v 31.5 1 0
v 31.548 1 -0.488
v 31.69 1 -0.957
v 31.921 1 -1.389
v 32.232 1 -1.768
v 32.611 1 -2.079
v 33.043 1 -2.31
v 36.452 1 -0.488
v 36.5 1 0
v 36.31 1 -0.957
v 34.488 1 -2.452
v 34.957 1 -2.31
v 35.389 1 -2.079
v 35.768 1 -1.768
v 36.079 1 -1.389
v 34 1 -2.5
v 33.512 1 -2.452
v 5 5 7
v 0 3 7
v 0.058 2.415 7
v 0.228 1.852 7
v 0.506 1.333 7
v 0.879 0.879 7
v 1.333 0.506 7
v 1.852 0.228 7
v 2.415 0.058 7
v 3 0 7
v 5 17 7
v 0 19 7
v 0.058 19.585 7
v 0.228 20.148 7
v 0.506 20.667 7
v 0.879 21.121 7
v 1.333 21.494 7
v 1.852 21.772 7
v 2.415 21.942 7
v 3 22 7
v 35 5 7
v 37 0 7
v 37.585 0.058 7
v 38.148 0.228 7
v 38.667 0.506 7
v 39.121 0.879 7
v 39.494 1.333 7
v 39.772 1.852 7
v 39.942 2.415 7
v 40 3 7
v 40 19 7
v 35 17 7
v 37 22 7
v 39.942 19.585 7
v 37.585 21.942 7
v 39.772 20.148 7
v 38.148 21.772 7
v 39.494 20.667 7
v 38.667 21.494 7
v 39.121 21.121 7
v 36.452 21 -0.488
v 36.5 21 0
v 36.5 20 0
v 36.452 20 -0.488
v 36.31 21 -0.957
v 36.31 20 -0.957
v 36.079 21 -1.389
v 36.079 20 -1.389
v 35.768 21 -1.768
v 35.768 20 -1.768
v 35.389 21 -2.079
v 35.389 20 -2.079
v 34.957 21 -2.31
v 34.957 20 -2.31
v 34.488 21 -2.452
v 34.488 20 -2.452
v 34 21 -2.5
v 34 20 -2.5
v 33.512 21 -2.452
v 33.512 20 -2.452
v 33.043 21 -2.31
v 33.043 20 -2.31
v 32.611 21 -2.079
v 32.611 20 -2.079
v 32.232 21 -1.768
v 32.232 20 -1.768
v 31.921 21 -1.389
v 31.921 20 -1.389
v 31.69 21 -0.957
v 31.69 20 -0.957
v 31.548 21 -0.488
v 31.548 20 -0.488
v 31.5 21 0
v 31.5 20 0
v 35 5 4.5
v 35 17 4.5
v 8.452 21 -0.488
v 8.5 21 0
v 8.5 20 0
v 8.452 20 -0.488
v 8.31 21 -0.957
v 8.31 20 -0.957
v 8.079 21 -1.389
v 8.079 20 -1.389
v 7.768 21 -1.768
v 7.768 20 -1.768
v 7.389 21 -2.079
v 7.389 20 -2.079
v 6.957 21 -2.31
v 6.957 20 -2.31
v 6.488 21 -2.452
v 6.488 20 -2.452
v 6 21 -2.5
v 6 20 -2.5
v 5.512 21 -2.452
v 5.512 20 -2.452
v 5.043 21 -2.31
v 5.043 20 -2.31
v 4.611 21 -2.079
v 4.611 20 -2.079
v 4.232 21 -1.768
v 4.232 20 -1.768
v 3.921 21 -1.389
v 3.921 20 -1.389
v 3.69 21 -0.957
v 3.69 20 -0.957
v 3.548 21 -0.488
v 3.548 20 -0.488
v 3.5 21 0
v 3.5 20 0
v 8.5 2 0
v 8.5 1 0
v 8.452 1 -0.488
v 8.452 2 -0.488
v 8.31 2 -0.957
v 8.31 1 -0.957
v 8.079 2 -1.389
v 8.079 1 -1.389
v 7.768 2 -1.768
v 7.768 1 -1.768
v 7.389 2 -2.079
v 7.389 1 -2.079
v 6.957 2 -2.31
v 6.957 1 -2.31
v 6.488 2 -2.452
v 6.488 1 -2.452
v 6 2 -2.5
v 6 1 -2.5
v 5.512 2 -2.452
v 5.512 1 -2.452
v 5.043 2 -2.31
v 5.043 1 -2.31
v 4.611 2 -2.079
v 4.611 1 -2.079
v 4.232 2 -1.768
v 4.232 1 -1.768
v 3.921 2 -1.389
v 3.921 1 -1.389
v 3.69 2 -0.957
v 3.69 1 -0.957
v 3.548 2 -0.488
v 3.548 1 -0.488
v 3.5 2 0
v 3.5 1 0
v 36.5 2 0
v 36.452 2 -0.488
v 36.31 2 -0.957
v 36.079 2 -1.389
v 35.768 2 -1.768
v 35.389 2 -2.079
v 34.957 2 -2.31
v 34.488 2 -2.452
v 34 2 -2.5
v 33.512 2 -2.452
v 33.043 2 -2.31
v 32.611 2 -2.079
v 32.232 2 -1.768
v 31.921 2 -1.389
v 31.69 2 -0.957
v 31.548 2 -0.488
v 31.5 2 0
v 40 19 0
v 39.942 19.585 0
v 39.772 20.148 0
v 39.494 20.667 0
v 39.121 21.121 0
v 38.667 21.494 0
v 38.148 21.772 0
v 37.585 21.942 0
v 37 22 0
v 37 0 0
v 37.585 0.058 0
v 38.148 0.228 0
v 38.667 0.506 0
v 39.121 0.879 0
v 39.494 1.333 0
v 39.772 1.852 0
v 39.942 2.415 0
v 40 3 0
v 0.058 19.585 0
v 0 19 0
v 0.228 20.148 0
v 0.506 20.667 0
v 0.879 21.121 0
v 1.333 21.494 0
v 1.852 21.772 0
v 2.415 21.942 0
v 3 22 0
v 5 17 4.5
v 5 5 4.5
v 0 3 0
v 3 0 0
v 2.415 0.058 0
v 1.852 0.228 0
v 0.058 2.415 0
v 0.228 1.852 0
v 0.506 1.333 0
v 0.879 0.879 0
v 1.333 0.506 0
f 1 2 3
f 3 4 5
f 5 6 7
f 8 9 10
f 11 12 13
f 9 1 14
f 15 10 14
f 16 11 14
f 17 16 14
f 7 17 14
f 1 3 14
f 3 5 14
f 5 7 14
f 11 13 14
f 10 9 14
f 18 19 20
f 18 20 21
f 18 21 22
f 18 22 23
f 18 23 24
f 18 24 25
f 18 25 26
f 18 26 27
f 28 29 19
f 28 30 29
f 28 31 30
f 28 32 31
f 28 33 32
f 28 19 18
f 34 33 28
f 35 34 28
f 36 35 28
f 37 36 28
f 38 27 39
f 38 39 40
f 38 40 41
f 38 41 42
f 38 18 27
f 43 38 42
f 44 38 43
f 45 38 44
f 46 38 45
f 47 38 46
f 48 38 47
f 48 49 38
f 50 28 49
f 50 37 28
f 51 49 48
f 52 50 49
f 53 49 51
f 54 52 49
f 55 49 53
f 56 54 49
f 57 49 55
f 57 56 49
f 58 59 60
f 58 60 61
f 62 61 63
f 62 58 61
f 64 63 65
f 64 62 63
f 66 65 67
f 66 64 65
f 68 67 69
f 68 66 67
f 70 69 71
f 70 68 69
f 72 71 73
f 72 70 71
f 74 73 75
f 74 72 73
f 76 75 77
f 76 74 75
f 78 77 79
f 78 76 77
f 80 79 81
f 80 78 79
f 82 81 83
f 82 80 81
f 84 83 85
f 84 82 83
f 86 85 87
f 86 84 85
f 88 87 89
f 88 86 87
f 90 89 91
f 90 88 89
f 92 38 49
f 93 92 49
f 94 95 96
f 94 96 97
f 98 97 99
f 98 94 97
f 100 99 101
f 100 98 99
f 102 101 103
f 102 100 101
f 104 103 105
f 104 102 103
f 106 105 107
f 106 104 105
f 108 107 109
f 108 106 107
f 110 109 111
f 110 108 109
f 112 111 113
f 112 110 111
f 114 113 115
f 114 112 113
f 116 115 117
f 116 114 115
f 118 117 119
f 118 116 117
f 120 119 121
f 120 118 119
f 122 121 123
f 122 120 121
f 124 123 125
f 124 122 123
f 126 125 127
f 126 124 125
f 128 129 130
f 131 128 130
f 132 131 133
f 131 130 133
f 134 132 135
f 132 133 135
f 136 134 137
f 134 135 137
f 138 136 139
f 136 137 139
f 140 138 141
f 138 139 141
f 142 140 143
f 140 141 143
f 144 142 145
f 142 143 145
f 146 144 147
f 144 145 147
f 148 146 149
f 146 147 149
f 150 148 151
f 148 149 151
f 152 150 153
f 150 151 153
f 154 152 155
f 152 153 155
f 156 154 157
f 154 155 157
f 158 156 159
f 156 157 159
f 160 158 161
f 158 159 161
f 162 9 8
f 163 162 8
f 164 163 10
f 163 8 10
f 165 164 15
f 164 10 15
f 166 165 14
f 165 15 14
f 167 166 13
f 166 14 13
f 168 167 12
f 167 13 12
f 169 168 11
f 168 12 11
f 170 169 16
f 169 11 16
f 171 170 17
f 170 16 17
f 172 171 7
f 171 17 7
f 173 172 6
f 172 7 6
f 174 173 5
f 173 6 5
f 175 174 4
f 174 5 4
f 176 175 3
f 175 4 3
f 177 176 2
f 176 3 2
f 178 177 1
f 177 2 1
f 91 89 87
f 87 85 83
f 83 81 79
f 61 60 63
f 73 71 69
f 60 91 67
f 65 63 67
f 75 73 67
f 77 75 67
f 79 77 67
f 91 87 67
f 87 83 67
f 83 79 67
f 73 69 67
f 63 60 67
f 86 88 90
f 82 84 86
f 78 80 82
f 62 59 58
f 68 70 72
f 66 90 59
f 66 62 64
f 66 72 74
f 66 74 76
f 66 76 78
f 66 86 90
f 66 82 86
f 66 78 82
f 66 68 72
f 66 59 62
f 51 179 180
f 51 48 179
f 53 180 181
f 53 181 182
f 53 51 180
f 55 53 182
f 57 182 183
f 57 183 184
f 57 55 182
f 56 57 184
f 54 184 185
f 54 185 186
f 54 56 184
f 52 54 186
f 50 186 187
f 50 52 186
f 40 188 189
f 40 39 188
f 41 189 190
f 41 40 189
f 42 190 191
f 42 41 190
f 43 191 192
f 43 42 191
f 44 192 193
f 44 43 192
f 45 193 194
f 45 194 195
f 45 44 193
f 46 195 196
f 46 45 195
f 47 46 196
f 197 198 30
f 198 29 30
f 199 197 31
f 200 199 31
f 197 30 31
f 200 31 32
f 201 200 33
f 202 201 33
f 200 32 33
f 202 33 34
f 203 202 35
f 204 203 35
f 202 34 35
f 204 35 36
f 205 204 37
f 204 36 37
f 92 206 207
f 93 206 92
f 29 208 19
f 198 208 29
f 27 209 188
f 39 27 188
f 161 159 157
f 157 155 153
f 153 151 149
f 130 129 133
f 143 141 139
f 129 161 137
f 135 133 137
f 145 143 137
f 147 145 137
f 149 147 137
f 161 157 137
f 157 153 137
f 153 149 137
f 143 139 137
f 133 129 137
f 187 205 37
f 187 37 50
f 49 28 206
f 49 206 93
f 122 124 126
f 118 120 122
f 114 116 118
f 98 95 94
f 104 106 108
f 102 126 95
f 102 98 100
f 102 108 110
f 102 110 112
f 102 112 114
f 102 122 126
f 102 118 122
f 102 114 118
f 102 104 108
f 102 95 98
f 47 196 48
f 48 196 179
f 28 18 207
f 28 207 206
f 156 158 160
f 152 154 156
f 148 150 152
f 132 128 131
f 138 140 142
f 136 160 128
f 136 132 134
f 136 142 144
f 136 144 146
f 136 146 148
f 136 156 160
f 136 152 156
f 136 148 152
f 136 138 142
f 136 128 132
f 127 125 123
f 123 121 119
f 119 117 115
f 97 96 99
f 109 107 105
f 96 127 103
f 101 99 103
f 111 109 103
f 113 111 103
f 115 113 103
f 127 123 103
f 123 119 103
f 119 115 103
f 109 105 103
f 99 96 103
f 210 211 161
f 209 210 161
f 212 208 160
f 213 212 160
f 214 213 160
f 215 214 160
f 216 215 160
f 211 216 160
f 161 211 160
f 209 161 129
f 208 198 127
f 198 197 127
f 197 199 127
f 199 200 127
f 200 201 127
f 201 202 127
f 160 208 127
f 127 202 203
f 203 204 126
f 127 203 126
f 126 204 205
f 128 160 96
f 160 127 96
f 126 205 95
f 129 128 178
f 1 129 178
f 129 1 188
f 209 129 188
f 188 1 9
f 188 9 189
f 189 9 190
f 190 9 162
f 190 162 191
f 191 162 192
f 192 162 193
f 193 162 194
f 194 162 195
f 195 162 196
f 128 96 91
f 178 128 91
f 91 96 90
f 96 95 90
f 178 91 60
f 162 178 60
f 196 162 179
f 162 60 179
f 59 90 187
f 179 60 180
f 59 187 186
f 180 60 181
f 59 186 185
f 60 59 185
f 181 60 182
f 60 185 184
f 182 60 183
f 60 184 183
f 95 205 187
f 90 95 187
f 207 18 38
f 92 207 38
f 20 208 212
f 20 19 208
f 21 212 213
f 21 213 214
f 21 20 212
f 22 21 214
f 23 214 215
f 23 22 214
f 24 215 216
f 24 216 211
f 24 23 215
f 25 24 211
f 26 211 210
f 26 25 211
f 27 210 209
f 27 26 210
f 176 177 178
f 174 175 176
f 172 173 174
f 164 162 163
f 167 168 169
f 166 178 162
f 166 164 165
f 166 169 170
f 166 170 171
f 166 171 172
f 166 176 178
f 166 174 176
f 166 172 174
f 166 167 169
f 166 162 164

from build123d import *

# Parameters (mm, degrees)
SKETCH1_W           = 40
SKETCH1_H           = 22
BOSS_EXTRUDE1_DEPTH = 7
FILLET1_R           = 3
SKETCH3_W           = 30
SKETCH3_H           = 12
CUT_EXTRUDE1_DEPTH  = 2.5
BOSS_EXTRUDE2_DEPTH = 1


with BuildPart() as part:
    # Sketch1 → Boss-Extrude1 (new body)
    with BuildSketch(Plane.XY):
        with Locations((20, 11)):
            Rectangle(SKETCH1_W, SKETCH1_H)
    extrude(amount=BOSS_EXTRUDE1_DEPTH)

    # Fillet1
    fillet1_edges = [part.edges().sort_by_distance(p)[0] for p in [
        (0, 22, 3.5),
        (40, 22, 3.5),
        (40, 0, 3.5),
        (0, 0, 3.5),
    ]]
    fillet(fillet1_edges, radius=FILLET1_R)

    # Sketch3 → Cut-Extrude1 (cut)
    with BuildSketch(Plane.XY.offset(7)):
        with Locations((20, 11)):
            Rectangle(SKETCH3_W, SKETCH3_H)
    extrude(amount=-CUT_EXTRUDE1_DEPTH, mode=Mode.SUBTRACT)

    # Sketch4 → Boss-Extrude2 (add)
    with BuildSketch(Plane(origin=(0, 21, 0), x_dir=(1, 0, 0), z_dir=(0, 1, 0))):
        with BuildLine():
            ThreePointArc((31.5, 0), (34, -2.5), (36.5, 0))
            Line((36.5, 0), (31.5, 0))
        make_face()
        with BuildLine():
            Line((31.5, 0), (36.5, 0))
            ThreePointArc((36.5, 0), (34, 2.5), (31.5, 0))
        make_face()
        with BuildLine():
            ThreePointArc((3.5, 0), (6, -2.5), (8.5, 0))
            Line((8.5, 0), (3.5, 0))
        make_face()
        with BuildLine():
            Line((3.5, 0), (8.5, 0))
            ThreePointArc((8.5, 0), (6, 2.5), (3.5, 0))
        make_face()
    boss_extrude2 = extrude(amount=-BOSS_EXTRUDE2_DEPTH)

    # Mirror1: Boss-Extrude2 across plane
    add(boss_extrude2.mirror(Plane(origin=(0, 11, 0), x_dir=(0, 0, 1), z_dir=(0, -1, 0))))


solid = part.part
